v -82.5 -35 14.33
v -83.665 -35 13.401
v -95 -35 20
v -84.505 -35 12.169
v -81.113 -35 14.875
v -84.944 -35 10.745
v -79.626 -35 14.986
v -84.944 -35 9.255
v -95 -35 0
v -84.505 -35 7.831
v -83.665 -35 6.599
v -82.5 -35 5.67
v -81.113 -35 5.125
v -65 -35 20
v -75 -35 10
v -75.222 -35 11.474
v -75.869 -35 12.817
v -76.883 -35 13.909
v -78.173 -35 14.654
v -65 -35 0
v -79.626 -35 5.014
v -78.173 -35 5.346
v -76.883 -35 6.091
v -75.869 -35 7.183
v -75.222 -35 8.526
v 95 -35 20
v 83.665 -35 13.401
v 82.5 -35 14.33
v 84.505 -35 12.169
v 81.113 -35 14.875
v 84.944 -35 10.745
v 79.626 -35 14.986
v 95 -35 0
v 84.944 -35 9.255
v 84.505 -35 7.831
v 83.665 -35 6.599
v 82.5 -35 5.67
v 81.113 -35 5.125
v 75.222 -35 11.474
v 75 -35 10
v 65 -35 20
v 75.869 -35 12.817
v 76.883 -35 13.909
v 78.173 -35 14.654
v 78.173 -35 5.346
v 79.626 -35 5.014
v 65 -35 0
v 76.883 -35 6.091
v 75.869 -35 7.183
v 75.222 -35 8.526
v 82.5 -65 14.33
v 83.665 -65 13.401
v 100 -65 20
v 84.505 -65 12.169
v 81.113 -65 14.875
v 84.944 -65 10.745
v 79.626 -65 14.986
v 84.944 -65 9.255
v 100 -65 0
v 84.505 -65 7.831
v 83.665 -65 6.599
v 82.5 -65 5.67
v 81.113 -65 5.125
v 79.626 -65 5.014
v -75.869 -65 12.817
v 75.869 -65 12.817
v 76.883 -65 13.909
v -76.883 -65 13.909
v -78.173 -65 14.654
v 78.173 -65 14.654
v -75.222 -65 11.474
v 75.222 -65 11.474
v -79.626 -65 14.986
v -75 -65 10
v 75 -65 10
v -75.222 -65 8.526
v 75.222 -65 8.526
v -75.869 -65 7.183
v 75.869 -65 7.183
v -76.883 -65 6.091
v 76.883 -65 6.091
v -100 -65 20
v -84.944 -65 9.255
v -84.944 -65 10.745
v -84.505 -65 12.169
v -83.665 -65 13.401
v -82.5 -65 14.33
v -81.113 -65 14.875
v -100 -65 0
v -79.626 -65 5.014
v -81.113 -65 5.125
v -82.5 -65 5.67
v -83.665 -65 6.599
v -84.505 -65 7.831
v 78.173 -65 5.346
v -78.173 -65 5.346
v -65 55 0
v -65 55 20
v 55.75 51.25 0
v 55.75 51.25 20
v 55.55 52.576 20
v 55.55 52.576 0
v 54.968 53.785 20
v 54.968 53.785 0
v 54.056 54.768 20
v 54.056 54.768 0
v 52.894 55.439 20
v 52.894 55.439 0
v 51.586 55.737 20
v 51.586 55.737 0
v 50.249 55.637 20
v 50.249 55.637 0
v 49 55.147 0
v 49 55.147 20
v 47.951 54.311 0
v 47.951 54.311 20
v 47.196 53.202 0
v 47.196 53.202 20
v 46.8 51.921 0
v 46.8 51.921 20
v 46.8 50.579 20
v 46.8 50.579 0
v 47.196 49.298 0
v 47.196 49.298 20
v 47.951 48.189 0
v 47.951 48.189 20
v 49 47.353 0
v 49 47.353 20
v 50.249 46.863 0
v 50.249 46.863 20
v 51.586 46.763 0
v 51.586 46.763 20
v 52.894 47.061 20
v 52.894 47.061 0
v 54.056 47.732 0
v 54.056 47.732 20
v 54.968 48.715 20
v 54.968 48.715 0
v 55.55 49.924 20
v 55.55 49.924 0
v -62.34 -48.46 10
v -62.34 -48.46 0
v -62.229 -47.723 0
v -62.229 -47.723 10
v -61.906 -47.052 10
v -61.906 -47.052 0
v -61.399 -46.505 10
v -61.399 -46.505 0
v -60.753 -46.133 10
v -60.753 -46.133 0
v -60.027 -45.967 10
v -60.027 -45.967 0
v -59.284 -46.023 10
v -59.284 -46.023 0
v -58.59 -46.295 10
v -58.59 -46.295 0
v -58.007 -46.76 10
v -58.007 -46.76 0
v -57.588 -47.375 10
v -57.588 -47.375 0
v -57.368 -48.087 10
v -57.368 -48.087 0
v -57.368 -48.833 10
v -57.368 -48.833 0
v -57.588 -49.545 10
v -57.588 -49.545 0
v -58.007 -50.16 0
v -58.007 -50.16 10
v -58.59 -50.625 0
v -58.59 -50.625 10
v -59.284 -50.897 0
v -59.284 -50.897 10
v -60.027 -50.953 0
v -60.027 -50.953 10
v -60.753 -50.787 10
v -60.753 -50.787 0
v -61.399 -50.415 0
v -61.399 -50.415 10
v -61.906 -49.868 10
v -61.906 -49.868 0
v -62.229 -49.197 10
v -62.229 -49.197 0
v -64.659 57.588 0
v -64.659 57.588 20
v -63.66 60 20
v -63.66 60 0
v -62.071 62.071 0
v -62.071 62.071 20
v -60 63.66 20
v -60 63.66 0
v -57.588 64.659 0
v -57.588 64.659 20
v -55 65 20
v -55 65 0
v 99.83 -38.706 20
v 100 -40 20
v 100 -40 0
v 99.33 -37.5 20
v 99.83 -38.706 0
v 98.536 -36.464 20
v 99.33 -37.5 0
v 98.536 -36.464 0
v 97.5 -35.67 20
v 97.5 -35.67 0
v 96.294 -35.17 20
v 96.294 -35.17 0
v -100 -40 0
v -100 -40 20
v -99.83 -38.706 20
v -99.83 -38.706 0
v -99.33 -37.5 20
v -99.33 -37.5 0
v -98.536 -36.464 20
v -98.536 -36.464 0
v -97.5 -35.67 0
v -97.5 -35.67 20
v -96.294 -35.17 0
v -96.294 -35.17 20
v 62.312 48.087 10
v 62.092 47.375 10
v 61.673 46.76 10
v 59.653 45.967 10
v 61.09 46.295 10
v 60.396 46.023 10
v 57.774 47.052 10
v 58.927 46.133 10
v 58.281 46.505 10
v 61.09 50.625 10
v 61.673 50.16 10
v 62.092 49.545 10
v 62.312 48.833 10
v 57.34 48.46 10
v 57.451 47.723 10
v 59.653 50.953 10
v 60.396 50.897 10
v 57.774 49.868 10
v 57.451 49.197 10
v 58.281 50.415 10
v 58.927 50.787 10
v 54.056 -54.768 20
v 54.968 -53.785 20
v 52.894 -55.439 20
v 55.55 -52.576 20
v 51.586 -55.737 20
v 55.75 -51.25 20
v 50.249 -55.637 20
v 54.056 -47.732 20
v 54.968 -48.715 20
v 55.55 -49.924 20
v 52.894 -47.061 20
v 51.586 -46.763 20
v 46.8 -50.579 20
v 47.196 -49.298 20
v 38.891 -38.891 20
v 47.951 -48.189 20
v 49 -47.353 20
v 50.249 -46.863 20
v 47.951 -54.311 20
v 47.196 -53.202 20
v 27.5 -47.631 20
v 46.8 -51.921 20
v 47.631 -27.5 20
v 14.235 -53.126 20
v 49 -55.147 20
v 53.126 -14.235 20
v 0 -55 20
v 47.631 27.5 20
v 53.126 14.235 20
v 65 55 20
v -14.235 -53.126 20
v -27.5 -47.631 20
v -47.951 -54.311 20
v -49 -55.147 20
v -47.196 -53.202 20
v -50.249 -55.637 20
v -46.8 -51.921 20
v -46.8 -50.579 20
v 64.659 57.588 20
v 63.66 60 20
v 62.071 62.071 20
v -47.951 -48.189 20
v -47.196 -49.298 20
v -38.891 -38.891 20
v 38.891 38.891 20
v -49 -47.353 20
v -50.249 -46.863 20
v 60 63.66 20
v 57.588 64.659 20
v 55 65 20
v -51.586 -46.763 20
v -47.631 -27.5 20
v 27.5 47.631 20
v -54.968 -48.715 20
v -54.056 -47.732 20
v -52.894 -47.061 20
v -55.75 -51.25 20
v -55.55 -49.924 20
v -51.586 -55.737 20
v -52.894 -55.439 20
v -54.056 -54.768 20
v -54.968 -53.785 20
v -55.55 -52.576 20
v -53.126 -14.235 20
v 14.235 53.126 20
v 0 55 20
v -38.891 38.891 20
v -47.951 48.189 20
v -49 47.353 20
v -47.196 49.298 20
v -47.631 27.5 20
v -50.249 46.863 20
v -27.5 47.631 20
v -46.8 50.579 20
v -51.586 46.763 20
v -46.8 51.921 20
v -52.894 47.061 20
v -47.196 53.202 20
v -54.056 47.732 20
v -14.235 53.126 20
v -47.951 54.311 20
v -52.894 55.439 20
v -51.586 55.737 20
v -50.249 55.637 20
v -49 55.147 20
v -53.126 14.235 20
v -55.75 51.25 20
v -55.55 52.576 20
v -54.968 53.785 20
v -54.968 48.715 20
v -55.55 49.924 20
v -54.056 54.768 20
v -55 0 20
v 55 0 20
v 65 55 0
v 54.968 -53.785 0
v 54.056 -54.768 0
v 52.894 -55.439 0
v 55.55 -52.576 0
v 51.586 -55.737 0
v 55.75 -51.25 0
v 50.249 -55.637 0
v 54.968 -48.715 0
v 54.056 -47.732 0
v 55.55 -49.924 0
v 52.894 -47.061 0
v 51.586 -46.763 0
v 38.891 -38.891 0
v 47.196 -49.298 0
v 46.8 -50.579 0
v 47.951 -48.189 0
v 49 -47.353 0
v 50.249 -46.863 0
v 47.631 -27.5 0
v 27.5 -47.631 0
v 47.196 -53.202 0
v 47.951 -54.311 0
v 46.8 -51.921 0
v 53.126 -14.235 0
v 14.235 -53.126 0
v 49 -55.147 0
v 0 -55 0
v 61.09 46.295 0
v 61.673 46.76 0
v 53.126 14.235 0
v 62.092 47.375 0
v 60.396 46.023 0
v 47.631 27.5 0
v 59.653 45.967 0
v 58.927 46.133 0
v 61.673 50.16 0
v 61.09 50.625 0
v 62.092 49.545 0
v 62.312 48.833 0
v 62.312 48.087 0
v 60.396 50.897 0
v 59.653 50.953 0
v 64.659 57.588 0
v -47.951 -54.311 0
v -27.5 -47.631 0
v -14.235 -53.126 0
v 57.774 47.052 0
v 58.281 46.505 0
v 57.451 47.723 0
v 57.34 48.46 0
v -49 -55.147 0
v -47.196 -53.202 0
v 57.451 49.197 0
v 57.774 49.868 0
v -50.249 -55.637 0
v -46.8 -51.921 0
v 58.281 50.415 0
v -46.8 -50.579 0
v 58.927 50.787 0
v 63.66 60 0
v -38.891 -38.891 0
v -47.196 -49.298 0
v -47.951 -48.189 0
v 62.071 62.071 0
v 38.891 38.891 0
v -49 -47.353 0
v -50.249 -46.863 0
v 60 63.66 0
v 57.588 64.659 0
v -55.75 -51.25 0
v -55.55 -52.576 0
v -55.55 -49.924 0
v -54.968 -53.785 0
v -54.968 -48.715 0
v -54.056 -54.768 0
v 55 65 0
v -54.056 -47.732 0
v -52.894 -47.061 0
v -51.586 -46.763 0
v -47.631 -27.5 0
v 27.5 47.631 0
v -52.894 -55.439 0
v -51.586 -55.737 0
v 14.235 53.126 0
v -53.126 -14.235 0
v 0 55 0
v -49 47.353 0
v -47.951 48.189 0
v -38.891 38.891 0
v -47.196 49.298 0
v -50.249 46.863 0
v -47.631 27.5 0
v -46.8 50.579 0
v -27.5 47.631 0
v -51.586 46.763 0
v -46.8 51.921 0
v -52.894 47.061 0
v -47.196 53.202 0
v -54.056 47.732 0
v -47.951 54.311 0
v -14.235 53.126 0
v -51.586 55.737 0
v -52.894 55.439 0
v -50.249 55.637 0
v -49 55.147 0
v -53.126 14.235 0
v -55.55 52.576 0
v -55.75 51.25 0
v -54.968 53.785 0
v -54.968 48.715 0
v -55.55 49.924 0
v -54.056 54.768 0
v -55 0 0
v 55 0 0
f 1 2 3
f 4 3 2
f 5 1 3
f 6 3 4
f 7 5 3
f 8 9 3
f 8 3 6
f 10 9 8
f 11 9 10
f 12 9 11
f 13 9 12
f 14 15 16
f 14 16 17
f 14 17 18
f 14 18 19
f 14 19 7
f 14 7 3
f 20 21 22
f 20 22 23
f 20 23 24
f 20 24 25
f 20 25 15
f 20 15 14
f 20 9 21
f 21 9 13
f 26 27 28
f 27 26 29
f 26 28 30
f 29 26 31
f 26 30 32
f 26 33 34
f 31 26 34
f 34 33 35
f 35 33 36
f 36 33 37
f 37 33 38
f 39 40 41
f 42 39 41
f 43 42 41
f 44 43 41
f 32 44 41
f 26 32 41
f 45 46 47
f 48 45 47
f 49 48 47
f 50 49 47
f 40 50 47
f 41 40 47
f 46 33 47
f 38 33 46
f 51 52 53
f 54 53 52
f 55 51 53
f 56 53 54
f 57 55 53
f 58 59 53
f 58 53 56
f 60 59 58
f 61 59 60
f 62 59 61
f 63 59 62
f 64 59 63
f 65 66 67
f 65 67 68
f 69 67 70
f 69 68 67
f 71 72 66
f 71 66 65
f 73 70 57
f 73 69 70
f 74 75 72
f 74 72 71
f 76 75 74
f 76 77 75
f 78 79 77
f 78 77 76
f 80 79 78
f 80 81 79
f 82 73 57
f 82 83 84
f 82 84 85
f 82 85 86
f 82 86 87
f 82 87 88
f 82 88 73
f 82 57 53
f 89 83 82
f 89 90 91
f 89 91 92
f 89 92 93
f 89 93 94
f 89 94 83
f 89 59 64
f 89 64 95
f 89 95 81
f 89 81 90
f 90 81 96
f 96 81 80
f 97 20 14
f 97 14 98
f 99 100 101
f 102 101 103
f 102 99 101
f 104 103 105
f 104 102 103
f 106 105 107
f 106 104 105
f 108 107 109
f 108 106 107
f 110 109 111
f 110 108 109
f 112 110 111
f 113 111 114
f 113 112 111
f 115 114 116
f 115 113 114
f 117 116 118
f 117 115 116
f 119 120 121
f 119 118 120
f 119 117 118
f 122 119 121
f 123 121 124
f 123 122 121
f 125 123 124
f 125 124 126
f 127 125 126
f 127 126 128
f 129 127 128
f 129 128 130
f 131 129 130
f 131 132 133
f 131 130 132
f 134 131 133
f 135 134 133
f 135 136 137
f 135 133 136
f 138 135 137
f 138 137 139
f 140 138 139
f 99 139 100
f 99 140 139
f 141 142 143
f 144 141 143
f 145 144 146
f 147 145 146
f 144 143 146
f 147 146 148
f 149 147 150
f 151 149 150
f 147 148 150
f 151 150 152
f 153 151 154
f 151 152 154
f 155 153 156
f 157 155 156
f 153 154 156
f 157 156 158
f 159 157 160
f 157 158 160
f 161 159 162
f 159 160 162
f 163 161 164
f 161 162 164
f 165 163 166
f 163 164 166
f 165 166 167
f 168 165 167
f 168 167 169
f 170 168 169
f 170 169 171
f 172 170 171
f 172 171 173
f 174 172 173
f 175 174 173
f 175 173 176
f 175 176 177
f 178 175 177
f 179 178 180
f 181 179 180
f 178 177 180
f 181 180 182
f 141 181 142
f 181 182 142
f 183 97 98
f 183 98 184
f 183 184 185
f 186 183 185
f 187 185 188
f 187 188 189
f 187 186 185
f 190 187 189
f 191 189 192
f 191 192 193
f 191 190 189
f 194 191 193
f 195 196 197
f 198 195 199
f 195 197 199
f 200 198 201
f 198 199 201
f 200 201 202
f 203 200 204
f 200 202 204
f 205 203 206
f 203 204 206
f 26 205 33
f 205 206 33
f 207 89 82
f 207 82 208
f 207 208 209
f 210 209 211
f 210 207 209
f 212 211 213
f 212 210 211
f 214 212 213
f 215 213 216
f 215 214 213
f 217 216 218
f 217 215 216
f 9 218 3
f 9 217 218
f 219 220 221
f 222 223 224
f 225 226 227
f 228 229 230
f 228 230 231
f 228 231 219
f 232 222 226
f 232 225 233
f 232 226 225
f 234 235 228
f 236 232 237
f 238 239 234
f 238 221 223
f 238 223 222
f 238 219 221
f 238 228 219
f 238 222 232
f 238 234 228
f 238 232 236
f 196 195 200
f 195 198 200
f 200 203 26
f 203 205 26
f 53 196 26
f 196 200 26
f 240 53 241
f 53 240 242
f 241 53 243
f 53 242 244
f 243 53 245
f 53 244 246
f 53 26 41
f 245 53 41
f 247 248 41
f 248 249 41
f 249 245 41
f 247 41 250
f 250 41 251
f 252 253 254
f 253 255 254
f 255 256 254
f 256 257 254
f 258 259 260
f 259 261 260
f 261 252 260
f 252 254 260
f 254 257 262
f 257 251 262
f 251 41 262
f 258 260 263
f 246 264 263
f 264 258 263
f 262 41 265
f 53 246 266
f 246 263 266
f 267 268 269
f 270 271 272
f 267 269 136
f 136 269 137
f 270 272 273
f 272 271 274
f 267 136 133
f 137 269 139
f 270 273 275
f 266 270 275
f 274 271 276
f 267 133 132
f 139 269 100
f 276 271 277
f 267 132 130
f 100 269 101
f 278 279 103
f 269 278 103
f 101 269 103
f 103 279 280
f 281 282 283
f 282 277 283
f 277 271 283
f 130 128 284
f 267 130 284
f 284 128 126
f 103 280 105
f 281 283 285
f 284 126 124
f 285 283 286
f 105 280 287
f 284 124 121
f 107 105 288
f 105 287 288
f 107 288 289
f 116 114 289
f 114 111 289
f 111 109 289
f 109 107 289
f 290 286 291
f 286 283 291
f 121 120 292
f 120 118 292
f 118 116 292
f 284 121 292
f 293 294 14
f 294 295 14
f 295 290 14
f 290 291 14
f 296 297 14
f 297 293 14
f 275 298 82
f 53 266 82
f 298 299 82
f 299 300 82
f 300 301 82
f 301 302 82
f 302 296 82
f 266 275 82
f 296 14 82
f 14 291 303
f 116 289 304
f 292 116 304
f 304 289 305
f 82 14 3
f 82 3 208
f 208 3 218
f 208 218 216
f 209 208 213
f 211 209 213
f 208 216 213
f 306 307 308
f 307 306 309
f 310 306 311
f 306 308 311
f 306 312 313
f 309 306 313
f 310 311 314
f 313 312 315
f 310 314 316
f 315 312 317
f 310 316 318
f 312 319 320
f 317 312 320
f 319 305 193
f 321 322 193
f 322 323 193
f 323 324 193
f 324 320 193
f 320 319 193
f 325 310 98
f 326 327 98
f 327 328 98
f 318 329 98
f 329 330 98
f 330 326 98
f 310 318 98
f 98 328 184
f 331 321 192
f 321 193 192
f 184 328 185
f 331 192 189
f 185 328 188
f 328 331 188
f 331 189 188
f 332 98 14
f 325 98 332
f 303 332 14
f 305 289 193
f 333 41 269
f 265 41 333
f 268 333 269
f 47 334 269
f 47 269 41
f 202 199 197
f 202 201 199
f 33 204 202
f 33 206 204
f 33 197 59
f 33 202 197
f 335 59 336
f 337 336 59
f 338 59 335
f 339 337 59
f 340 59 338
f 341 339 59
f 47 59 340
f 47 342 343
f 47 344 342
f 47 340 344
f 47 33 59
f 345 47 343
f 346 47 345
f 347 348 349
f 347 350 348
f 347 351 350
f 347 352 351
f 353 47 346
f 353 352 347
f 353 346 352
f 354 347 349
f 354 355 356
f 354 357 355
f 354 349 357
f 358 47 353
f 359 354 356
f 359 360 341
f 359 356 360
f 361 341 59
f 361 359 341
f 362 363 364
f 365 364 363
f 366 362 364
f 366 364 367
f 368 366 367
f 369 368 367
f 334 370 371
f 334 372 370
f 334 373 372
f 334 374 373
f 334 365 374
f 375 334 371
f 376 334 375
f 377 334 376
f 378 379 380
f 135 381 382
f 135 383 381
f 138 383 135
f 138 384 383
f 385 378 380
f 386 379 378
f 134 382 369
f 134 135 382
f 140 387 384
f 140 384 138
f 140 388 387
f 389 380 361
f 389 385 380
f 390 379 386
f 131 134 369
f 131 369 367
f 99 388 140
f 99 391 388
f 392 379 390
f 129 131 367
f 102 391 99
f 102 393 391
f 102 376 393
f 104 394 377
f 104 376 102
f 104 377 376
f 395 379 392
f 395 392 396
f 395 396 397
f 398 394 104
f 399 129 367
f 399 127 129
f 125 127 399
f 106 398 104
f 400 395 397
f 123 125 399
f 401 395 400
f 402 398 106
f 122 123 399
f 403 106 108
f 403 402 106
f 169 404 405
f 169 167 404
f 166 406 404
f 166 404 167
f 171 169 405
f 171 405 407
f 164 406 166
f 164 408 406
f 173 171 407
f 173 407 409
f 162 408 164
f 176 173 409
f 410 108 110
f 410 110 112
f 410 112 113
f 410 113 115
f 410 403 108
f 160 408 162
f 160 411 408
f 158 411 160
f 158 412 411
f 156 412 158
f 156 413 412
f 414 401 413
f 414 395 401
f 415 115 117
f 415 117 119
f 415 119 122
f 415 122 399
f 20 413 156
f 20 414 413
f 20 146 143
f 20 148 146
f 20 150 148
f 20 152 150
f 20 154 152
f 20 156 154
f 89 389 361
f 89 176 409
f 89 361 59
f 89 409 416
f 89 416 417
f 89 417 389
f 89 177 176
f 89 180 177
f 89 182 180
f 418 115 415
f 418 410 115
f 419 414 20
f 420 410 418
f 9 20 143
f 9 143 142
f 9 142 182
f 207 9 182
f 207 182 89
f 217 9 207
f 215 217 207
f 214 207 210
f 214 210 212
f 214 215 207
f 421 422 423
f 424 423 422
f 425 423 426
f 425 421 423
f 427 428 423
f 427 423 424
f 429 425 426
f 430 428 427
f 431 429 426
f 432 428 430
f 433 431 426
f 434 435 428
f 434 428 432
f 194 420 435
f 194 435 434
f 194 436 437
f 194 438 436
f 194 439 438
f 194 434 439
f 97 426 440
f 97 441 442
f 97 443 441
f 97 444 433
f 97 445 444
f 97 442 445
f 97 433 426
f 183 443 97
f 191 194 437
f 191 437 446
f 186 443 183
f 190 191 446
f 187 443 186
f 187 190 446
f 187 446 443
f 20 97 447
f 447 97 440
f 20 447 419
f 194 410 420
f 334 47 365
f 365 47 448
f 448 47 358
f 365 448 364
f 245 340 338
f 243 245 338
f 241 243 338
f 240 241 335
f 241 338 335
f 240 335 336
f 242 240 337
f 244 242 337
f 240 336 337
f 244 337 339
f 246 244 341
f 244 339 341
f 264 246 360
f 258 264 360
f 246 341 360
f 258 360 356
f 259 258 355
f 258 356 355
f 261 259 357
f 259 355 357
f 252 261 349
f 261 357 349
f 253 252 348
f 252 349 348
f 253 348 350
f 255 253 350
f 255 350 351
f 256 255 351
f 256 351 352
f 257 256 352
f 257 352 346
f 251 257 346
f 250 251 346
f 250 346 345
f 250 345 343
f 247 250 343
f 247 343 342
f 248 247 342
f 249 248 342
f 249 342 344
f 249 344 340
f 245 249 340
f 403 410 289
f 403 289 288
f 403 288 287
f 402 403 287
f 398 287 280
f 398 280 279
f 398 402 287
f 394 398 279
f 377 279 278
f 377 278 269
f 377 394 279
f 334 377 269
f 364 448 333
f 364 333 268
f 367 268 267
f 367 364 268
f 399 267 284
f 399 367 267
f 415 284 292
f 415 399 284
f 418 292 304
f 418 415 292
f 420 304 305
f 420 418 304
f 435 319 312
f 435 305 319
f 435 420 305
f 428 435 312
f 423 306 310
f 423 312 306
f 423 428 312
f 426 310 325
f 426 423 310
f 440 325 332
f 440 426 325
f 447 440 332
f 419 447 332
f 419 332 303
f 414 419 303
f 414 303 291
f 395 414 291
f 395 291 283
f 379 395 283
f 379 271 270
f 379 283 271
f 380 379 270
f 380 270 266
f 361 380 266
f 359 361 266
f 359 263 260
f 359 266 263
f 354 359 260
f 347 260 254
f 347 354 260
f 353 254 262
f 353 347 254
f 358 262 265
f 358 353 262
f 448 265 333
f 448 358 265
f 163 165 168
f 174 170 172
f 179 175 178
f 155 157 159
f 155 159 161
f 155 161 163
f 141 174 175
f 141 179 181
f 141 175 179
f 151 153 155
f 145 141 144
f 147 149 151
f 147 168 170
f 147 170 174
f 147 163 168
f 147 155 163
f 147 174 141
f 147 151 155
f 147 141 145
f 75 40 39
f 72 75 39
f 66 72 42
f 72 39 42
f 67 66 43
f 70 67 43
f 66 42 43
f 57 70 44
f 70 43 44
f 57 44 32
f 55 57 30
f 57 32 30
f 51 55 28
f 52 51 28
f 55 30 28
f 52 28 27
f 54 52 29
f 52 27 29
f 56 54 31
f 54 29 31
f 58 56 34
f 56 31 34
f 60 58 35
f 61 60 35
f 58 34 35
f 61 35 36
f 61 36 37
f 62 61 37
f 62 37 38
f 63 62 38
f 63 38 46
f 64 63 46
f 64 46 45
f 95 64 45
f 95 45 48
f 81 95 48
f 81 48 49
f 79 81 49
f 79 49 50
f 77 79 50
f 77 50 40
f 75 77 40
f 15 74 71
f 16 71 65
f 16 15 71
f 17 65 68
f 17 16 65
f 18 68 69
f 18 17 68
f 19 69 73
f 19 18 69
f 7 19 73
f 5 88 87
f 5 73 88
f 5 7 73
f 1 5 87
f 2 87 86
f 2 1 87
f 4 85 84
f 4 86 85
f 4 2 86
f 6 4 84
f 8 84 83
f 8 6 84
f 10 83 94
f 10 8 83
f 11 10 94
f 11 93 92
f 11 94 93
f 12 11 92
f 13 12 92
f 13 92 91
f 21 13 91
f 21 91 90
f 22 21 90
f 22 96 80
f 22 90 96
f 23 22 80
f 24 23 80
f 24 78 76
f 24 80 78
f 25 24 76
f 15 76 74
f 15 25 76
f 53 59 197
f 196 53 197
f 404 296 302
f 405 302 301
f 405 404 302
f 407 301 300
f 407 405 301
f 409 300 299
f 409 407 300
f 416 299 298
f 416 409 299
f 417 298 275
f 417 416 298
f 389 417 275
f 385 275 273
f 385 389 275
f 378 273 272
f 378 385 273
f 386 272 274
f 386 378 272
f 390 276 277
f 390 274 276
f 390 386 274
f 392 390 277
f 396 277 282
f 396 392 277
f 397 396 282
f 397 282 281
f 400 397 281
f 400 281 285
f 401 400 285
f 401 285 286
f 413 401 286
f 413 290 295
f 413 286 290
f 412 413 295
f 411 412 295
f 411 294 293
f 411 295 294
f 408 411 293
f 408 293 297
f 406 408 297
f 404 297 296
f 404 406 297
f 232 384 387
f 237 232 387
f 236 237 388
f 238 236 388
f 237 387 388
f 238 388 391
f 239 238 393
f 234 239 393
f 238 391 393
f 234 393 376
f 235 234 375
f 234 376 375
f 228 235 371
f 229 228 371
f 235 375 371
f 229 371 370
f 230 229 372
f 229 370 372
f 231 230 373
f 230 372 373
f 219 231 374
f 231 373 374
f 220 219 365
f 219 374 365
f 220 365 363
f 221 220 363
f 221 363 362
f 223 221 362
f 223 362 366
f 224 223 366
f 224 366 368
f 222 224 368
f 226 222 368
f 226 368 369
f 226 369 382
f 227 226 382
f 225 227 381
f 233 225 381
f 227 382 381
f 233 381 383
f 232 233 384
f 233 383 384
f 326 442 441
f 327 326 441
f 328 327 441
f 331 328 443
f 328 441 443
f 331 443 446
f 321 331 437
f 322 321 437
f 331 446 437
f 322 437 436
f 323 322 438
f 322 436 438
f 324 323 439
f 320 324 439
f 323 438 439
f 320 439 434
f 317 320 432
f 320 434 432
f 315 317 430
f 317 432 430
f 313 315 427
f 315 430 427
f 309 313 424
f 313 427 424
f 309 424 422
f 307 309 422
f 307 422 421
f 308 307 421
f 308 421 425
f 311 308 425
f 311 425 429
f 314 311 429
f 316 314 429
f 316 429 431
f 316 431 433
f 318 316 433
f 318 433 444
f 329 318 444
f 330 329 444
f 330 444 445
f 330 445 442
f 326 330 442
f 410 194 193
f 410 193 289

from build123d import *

# Parameters (mm, degrees)
EXTRUDE_1_DEPTH          = 20
SKETCH_2_R               = 4.5
CUT_EXTRUDE_2_DEPTH      = 95.074438611
MIRROR_2_COPY_1_SKETCH_R = 4.5
MIRROR_2_COPY_1_DEPTH    = 95.074438611
SKETCH_3_R               = 55
CUT_EXTRUDE_3_DEPTH      = 95.074438611
EXTRUDE_2_DEPTH          = 20
SKETCH_6_R               = 5
CUT_EXTRUDE_4_DEPTH      = 143.828568571
SKETCH_1312_R            = 2.5
CUT_EXTRUDE_5_DEPTH      = 10


with BuildPart() as part:
    # 草圖1 → 填料-伸長1 (new body)
    with BuildSketch(Plane.XY):
        with BuildLine():
            Line((-55, 65), (55, 65))
            ThreePointArc((55, 65), (62.071067812, 62.071067812), (65, 55))
            Line((65, 55), (65, -65))
            Line((65, -65), (-65, -65))
            Line((-65, -65), (-65, 55))
            ThreePointArc((-65, 55), (-62.071067812, 62.071067812), (-55, 65))
        make_face()
    extrude(amount=EXTRUDE_1_DEPTH)

    # 草圖2 → 除料-伸長2 (cut, through all)
    with BuildSketch(Plane.XY):
        with Locations((51.25, 51.25)):
            Circle(SKETCH_2_R)
    cut_extrude_2 = extrude(amount=CUT_EXTRUDE_2_DEPTH, mode=Mode.SUBTRACT)

    # 鏡射1: 除料-伸長2 across plane
    add(cut_extrude_2.mirror(Plane(origin=(0, 0, 0), x_dir=(0, 0, 1), z_dir=(1, 0, 0))), mode=Mode.SUBTRACT)

    # 鏡射2: 除料-伸長2 across plane
    add(cut_extrude_2.mirror(Plane.ZX), mode=Mode.SUBTRACT)

    # 鏡射2 copy 1 sketch → 鏡射2 copy 1 (cut, through all)
    with BuildSketch(Plane(origin=(0, 0, 0), x_dir=(-1, 0, 0), z_dir=(0, 0, 1))):
        with Locations((51.25, 51.25)):
            Circle(MIRROR_2_COPY_1_SKETCH_R)
    extrude(amount=MIRROR_2_COPY_1_DEPTH, mode=Mode.SUBTRACT)

    # 草圖3 → 除料-伸長3 (cut, through all)
    with BuildSketch(Plane.XY):
        Circle(SKETCH_3_R)
    extrude(amount=CUT_EXTRUDE_3_DEPTH, mode=Mode.SUBTRACT)

    # 草圖5 → 填料-伸長2 (add)
    with BuildSketch(Plane.XY):
        with BuildLine():
            Line((65, -65), (100, -65))
            Line((100, -65), (100, -40))
            ThreePointArc((100, -40), (98.535533906, -36.464466094), (95, -35))
            Line((95, -35), (65, -35))
            Line((65, -35), (65, -65))
        make_face()
    extrude_2 = extrude(amount=EXTRUDE_2_DEPTH)

    # 草圖6 → 除料-伸長4 (cut, through all)
    with BuildSketch(Plane(origin=(0, -35, 0), x_dir=(1, 0, 0), z_dir=(0, 1, 0))):
        with Locations(Location((80, -10, 0), (0, 0, 180))):
            Circle(SKETCH_6_R)
    cut_extrude_4 = extrude(amount=-CUT_EXTRUDE_4_DEPTH, mode=Mode.SUBTRACT)

    # 鏡射3: 填料-伸長2 across plane
    add(extrude_2.mirror(Plane(origin=(0, 0, 0), x_dir=(0, 0, 1), z_dir=(1, 0, 0))))

    # 鏡射4: 除料-伸長4 across plane
    add(cut_extrude_4.mirror(Plane(origin=(0, 0, 0), x_dir=(0, 0, 1), z_dir=(1, 0, 0))), mode=Mode.SUBTRACT)

    # Sketch 1312 → 除料-伸長5 (cut)
    with BuildSketch(Plane(origin=(0, 0, 0), x_dir=(-1, 0, 0), z_dir=(0, 0, -1))):
        with Locations((59.84, -48.46)):
            Circle(SKETCH_1312_R)
        with Locations((-59.84, 48.46)):
            Circle(SKETCH_1312_R)
    extrude(amount=-CUT_EXTRUDE_5_DEPTH, mode=Mode.SUBTRACT)


solid = part.part
